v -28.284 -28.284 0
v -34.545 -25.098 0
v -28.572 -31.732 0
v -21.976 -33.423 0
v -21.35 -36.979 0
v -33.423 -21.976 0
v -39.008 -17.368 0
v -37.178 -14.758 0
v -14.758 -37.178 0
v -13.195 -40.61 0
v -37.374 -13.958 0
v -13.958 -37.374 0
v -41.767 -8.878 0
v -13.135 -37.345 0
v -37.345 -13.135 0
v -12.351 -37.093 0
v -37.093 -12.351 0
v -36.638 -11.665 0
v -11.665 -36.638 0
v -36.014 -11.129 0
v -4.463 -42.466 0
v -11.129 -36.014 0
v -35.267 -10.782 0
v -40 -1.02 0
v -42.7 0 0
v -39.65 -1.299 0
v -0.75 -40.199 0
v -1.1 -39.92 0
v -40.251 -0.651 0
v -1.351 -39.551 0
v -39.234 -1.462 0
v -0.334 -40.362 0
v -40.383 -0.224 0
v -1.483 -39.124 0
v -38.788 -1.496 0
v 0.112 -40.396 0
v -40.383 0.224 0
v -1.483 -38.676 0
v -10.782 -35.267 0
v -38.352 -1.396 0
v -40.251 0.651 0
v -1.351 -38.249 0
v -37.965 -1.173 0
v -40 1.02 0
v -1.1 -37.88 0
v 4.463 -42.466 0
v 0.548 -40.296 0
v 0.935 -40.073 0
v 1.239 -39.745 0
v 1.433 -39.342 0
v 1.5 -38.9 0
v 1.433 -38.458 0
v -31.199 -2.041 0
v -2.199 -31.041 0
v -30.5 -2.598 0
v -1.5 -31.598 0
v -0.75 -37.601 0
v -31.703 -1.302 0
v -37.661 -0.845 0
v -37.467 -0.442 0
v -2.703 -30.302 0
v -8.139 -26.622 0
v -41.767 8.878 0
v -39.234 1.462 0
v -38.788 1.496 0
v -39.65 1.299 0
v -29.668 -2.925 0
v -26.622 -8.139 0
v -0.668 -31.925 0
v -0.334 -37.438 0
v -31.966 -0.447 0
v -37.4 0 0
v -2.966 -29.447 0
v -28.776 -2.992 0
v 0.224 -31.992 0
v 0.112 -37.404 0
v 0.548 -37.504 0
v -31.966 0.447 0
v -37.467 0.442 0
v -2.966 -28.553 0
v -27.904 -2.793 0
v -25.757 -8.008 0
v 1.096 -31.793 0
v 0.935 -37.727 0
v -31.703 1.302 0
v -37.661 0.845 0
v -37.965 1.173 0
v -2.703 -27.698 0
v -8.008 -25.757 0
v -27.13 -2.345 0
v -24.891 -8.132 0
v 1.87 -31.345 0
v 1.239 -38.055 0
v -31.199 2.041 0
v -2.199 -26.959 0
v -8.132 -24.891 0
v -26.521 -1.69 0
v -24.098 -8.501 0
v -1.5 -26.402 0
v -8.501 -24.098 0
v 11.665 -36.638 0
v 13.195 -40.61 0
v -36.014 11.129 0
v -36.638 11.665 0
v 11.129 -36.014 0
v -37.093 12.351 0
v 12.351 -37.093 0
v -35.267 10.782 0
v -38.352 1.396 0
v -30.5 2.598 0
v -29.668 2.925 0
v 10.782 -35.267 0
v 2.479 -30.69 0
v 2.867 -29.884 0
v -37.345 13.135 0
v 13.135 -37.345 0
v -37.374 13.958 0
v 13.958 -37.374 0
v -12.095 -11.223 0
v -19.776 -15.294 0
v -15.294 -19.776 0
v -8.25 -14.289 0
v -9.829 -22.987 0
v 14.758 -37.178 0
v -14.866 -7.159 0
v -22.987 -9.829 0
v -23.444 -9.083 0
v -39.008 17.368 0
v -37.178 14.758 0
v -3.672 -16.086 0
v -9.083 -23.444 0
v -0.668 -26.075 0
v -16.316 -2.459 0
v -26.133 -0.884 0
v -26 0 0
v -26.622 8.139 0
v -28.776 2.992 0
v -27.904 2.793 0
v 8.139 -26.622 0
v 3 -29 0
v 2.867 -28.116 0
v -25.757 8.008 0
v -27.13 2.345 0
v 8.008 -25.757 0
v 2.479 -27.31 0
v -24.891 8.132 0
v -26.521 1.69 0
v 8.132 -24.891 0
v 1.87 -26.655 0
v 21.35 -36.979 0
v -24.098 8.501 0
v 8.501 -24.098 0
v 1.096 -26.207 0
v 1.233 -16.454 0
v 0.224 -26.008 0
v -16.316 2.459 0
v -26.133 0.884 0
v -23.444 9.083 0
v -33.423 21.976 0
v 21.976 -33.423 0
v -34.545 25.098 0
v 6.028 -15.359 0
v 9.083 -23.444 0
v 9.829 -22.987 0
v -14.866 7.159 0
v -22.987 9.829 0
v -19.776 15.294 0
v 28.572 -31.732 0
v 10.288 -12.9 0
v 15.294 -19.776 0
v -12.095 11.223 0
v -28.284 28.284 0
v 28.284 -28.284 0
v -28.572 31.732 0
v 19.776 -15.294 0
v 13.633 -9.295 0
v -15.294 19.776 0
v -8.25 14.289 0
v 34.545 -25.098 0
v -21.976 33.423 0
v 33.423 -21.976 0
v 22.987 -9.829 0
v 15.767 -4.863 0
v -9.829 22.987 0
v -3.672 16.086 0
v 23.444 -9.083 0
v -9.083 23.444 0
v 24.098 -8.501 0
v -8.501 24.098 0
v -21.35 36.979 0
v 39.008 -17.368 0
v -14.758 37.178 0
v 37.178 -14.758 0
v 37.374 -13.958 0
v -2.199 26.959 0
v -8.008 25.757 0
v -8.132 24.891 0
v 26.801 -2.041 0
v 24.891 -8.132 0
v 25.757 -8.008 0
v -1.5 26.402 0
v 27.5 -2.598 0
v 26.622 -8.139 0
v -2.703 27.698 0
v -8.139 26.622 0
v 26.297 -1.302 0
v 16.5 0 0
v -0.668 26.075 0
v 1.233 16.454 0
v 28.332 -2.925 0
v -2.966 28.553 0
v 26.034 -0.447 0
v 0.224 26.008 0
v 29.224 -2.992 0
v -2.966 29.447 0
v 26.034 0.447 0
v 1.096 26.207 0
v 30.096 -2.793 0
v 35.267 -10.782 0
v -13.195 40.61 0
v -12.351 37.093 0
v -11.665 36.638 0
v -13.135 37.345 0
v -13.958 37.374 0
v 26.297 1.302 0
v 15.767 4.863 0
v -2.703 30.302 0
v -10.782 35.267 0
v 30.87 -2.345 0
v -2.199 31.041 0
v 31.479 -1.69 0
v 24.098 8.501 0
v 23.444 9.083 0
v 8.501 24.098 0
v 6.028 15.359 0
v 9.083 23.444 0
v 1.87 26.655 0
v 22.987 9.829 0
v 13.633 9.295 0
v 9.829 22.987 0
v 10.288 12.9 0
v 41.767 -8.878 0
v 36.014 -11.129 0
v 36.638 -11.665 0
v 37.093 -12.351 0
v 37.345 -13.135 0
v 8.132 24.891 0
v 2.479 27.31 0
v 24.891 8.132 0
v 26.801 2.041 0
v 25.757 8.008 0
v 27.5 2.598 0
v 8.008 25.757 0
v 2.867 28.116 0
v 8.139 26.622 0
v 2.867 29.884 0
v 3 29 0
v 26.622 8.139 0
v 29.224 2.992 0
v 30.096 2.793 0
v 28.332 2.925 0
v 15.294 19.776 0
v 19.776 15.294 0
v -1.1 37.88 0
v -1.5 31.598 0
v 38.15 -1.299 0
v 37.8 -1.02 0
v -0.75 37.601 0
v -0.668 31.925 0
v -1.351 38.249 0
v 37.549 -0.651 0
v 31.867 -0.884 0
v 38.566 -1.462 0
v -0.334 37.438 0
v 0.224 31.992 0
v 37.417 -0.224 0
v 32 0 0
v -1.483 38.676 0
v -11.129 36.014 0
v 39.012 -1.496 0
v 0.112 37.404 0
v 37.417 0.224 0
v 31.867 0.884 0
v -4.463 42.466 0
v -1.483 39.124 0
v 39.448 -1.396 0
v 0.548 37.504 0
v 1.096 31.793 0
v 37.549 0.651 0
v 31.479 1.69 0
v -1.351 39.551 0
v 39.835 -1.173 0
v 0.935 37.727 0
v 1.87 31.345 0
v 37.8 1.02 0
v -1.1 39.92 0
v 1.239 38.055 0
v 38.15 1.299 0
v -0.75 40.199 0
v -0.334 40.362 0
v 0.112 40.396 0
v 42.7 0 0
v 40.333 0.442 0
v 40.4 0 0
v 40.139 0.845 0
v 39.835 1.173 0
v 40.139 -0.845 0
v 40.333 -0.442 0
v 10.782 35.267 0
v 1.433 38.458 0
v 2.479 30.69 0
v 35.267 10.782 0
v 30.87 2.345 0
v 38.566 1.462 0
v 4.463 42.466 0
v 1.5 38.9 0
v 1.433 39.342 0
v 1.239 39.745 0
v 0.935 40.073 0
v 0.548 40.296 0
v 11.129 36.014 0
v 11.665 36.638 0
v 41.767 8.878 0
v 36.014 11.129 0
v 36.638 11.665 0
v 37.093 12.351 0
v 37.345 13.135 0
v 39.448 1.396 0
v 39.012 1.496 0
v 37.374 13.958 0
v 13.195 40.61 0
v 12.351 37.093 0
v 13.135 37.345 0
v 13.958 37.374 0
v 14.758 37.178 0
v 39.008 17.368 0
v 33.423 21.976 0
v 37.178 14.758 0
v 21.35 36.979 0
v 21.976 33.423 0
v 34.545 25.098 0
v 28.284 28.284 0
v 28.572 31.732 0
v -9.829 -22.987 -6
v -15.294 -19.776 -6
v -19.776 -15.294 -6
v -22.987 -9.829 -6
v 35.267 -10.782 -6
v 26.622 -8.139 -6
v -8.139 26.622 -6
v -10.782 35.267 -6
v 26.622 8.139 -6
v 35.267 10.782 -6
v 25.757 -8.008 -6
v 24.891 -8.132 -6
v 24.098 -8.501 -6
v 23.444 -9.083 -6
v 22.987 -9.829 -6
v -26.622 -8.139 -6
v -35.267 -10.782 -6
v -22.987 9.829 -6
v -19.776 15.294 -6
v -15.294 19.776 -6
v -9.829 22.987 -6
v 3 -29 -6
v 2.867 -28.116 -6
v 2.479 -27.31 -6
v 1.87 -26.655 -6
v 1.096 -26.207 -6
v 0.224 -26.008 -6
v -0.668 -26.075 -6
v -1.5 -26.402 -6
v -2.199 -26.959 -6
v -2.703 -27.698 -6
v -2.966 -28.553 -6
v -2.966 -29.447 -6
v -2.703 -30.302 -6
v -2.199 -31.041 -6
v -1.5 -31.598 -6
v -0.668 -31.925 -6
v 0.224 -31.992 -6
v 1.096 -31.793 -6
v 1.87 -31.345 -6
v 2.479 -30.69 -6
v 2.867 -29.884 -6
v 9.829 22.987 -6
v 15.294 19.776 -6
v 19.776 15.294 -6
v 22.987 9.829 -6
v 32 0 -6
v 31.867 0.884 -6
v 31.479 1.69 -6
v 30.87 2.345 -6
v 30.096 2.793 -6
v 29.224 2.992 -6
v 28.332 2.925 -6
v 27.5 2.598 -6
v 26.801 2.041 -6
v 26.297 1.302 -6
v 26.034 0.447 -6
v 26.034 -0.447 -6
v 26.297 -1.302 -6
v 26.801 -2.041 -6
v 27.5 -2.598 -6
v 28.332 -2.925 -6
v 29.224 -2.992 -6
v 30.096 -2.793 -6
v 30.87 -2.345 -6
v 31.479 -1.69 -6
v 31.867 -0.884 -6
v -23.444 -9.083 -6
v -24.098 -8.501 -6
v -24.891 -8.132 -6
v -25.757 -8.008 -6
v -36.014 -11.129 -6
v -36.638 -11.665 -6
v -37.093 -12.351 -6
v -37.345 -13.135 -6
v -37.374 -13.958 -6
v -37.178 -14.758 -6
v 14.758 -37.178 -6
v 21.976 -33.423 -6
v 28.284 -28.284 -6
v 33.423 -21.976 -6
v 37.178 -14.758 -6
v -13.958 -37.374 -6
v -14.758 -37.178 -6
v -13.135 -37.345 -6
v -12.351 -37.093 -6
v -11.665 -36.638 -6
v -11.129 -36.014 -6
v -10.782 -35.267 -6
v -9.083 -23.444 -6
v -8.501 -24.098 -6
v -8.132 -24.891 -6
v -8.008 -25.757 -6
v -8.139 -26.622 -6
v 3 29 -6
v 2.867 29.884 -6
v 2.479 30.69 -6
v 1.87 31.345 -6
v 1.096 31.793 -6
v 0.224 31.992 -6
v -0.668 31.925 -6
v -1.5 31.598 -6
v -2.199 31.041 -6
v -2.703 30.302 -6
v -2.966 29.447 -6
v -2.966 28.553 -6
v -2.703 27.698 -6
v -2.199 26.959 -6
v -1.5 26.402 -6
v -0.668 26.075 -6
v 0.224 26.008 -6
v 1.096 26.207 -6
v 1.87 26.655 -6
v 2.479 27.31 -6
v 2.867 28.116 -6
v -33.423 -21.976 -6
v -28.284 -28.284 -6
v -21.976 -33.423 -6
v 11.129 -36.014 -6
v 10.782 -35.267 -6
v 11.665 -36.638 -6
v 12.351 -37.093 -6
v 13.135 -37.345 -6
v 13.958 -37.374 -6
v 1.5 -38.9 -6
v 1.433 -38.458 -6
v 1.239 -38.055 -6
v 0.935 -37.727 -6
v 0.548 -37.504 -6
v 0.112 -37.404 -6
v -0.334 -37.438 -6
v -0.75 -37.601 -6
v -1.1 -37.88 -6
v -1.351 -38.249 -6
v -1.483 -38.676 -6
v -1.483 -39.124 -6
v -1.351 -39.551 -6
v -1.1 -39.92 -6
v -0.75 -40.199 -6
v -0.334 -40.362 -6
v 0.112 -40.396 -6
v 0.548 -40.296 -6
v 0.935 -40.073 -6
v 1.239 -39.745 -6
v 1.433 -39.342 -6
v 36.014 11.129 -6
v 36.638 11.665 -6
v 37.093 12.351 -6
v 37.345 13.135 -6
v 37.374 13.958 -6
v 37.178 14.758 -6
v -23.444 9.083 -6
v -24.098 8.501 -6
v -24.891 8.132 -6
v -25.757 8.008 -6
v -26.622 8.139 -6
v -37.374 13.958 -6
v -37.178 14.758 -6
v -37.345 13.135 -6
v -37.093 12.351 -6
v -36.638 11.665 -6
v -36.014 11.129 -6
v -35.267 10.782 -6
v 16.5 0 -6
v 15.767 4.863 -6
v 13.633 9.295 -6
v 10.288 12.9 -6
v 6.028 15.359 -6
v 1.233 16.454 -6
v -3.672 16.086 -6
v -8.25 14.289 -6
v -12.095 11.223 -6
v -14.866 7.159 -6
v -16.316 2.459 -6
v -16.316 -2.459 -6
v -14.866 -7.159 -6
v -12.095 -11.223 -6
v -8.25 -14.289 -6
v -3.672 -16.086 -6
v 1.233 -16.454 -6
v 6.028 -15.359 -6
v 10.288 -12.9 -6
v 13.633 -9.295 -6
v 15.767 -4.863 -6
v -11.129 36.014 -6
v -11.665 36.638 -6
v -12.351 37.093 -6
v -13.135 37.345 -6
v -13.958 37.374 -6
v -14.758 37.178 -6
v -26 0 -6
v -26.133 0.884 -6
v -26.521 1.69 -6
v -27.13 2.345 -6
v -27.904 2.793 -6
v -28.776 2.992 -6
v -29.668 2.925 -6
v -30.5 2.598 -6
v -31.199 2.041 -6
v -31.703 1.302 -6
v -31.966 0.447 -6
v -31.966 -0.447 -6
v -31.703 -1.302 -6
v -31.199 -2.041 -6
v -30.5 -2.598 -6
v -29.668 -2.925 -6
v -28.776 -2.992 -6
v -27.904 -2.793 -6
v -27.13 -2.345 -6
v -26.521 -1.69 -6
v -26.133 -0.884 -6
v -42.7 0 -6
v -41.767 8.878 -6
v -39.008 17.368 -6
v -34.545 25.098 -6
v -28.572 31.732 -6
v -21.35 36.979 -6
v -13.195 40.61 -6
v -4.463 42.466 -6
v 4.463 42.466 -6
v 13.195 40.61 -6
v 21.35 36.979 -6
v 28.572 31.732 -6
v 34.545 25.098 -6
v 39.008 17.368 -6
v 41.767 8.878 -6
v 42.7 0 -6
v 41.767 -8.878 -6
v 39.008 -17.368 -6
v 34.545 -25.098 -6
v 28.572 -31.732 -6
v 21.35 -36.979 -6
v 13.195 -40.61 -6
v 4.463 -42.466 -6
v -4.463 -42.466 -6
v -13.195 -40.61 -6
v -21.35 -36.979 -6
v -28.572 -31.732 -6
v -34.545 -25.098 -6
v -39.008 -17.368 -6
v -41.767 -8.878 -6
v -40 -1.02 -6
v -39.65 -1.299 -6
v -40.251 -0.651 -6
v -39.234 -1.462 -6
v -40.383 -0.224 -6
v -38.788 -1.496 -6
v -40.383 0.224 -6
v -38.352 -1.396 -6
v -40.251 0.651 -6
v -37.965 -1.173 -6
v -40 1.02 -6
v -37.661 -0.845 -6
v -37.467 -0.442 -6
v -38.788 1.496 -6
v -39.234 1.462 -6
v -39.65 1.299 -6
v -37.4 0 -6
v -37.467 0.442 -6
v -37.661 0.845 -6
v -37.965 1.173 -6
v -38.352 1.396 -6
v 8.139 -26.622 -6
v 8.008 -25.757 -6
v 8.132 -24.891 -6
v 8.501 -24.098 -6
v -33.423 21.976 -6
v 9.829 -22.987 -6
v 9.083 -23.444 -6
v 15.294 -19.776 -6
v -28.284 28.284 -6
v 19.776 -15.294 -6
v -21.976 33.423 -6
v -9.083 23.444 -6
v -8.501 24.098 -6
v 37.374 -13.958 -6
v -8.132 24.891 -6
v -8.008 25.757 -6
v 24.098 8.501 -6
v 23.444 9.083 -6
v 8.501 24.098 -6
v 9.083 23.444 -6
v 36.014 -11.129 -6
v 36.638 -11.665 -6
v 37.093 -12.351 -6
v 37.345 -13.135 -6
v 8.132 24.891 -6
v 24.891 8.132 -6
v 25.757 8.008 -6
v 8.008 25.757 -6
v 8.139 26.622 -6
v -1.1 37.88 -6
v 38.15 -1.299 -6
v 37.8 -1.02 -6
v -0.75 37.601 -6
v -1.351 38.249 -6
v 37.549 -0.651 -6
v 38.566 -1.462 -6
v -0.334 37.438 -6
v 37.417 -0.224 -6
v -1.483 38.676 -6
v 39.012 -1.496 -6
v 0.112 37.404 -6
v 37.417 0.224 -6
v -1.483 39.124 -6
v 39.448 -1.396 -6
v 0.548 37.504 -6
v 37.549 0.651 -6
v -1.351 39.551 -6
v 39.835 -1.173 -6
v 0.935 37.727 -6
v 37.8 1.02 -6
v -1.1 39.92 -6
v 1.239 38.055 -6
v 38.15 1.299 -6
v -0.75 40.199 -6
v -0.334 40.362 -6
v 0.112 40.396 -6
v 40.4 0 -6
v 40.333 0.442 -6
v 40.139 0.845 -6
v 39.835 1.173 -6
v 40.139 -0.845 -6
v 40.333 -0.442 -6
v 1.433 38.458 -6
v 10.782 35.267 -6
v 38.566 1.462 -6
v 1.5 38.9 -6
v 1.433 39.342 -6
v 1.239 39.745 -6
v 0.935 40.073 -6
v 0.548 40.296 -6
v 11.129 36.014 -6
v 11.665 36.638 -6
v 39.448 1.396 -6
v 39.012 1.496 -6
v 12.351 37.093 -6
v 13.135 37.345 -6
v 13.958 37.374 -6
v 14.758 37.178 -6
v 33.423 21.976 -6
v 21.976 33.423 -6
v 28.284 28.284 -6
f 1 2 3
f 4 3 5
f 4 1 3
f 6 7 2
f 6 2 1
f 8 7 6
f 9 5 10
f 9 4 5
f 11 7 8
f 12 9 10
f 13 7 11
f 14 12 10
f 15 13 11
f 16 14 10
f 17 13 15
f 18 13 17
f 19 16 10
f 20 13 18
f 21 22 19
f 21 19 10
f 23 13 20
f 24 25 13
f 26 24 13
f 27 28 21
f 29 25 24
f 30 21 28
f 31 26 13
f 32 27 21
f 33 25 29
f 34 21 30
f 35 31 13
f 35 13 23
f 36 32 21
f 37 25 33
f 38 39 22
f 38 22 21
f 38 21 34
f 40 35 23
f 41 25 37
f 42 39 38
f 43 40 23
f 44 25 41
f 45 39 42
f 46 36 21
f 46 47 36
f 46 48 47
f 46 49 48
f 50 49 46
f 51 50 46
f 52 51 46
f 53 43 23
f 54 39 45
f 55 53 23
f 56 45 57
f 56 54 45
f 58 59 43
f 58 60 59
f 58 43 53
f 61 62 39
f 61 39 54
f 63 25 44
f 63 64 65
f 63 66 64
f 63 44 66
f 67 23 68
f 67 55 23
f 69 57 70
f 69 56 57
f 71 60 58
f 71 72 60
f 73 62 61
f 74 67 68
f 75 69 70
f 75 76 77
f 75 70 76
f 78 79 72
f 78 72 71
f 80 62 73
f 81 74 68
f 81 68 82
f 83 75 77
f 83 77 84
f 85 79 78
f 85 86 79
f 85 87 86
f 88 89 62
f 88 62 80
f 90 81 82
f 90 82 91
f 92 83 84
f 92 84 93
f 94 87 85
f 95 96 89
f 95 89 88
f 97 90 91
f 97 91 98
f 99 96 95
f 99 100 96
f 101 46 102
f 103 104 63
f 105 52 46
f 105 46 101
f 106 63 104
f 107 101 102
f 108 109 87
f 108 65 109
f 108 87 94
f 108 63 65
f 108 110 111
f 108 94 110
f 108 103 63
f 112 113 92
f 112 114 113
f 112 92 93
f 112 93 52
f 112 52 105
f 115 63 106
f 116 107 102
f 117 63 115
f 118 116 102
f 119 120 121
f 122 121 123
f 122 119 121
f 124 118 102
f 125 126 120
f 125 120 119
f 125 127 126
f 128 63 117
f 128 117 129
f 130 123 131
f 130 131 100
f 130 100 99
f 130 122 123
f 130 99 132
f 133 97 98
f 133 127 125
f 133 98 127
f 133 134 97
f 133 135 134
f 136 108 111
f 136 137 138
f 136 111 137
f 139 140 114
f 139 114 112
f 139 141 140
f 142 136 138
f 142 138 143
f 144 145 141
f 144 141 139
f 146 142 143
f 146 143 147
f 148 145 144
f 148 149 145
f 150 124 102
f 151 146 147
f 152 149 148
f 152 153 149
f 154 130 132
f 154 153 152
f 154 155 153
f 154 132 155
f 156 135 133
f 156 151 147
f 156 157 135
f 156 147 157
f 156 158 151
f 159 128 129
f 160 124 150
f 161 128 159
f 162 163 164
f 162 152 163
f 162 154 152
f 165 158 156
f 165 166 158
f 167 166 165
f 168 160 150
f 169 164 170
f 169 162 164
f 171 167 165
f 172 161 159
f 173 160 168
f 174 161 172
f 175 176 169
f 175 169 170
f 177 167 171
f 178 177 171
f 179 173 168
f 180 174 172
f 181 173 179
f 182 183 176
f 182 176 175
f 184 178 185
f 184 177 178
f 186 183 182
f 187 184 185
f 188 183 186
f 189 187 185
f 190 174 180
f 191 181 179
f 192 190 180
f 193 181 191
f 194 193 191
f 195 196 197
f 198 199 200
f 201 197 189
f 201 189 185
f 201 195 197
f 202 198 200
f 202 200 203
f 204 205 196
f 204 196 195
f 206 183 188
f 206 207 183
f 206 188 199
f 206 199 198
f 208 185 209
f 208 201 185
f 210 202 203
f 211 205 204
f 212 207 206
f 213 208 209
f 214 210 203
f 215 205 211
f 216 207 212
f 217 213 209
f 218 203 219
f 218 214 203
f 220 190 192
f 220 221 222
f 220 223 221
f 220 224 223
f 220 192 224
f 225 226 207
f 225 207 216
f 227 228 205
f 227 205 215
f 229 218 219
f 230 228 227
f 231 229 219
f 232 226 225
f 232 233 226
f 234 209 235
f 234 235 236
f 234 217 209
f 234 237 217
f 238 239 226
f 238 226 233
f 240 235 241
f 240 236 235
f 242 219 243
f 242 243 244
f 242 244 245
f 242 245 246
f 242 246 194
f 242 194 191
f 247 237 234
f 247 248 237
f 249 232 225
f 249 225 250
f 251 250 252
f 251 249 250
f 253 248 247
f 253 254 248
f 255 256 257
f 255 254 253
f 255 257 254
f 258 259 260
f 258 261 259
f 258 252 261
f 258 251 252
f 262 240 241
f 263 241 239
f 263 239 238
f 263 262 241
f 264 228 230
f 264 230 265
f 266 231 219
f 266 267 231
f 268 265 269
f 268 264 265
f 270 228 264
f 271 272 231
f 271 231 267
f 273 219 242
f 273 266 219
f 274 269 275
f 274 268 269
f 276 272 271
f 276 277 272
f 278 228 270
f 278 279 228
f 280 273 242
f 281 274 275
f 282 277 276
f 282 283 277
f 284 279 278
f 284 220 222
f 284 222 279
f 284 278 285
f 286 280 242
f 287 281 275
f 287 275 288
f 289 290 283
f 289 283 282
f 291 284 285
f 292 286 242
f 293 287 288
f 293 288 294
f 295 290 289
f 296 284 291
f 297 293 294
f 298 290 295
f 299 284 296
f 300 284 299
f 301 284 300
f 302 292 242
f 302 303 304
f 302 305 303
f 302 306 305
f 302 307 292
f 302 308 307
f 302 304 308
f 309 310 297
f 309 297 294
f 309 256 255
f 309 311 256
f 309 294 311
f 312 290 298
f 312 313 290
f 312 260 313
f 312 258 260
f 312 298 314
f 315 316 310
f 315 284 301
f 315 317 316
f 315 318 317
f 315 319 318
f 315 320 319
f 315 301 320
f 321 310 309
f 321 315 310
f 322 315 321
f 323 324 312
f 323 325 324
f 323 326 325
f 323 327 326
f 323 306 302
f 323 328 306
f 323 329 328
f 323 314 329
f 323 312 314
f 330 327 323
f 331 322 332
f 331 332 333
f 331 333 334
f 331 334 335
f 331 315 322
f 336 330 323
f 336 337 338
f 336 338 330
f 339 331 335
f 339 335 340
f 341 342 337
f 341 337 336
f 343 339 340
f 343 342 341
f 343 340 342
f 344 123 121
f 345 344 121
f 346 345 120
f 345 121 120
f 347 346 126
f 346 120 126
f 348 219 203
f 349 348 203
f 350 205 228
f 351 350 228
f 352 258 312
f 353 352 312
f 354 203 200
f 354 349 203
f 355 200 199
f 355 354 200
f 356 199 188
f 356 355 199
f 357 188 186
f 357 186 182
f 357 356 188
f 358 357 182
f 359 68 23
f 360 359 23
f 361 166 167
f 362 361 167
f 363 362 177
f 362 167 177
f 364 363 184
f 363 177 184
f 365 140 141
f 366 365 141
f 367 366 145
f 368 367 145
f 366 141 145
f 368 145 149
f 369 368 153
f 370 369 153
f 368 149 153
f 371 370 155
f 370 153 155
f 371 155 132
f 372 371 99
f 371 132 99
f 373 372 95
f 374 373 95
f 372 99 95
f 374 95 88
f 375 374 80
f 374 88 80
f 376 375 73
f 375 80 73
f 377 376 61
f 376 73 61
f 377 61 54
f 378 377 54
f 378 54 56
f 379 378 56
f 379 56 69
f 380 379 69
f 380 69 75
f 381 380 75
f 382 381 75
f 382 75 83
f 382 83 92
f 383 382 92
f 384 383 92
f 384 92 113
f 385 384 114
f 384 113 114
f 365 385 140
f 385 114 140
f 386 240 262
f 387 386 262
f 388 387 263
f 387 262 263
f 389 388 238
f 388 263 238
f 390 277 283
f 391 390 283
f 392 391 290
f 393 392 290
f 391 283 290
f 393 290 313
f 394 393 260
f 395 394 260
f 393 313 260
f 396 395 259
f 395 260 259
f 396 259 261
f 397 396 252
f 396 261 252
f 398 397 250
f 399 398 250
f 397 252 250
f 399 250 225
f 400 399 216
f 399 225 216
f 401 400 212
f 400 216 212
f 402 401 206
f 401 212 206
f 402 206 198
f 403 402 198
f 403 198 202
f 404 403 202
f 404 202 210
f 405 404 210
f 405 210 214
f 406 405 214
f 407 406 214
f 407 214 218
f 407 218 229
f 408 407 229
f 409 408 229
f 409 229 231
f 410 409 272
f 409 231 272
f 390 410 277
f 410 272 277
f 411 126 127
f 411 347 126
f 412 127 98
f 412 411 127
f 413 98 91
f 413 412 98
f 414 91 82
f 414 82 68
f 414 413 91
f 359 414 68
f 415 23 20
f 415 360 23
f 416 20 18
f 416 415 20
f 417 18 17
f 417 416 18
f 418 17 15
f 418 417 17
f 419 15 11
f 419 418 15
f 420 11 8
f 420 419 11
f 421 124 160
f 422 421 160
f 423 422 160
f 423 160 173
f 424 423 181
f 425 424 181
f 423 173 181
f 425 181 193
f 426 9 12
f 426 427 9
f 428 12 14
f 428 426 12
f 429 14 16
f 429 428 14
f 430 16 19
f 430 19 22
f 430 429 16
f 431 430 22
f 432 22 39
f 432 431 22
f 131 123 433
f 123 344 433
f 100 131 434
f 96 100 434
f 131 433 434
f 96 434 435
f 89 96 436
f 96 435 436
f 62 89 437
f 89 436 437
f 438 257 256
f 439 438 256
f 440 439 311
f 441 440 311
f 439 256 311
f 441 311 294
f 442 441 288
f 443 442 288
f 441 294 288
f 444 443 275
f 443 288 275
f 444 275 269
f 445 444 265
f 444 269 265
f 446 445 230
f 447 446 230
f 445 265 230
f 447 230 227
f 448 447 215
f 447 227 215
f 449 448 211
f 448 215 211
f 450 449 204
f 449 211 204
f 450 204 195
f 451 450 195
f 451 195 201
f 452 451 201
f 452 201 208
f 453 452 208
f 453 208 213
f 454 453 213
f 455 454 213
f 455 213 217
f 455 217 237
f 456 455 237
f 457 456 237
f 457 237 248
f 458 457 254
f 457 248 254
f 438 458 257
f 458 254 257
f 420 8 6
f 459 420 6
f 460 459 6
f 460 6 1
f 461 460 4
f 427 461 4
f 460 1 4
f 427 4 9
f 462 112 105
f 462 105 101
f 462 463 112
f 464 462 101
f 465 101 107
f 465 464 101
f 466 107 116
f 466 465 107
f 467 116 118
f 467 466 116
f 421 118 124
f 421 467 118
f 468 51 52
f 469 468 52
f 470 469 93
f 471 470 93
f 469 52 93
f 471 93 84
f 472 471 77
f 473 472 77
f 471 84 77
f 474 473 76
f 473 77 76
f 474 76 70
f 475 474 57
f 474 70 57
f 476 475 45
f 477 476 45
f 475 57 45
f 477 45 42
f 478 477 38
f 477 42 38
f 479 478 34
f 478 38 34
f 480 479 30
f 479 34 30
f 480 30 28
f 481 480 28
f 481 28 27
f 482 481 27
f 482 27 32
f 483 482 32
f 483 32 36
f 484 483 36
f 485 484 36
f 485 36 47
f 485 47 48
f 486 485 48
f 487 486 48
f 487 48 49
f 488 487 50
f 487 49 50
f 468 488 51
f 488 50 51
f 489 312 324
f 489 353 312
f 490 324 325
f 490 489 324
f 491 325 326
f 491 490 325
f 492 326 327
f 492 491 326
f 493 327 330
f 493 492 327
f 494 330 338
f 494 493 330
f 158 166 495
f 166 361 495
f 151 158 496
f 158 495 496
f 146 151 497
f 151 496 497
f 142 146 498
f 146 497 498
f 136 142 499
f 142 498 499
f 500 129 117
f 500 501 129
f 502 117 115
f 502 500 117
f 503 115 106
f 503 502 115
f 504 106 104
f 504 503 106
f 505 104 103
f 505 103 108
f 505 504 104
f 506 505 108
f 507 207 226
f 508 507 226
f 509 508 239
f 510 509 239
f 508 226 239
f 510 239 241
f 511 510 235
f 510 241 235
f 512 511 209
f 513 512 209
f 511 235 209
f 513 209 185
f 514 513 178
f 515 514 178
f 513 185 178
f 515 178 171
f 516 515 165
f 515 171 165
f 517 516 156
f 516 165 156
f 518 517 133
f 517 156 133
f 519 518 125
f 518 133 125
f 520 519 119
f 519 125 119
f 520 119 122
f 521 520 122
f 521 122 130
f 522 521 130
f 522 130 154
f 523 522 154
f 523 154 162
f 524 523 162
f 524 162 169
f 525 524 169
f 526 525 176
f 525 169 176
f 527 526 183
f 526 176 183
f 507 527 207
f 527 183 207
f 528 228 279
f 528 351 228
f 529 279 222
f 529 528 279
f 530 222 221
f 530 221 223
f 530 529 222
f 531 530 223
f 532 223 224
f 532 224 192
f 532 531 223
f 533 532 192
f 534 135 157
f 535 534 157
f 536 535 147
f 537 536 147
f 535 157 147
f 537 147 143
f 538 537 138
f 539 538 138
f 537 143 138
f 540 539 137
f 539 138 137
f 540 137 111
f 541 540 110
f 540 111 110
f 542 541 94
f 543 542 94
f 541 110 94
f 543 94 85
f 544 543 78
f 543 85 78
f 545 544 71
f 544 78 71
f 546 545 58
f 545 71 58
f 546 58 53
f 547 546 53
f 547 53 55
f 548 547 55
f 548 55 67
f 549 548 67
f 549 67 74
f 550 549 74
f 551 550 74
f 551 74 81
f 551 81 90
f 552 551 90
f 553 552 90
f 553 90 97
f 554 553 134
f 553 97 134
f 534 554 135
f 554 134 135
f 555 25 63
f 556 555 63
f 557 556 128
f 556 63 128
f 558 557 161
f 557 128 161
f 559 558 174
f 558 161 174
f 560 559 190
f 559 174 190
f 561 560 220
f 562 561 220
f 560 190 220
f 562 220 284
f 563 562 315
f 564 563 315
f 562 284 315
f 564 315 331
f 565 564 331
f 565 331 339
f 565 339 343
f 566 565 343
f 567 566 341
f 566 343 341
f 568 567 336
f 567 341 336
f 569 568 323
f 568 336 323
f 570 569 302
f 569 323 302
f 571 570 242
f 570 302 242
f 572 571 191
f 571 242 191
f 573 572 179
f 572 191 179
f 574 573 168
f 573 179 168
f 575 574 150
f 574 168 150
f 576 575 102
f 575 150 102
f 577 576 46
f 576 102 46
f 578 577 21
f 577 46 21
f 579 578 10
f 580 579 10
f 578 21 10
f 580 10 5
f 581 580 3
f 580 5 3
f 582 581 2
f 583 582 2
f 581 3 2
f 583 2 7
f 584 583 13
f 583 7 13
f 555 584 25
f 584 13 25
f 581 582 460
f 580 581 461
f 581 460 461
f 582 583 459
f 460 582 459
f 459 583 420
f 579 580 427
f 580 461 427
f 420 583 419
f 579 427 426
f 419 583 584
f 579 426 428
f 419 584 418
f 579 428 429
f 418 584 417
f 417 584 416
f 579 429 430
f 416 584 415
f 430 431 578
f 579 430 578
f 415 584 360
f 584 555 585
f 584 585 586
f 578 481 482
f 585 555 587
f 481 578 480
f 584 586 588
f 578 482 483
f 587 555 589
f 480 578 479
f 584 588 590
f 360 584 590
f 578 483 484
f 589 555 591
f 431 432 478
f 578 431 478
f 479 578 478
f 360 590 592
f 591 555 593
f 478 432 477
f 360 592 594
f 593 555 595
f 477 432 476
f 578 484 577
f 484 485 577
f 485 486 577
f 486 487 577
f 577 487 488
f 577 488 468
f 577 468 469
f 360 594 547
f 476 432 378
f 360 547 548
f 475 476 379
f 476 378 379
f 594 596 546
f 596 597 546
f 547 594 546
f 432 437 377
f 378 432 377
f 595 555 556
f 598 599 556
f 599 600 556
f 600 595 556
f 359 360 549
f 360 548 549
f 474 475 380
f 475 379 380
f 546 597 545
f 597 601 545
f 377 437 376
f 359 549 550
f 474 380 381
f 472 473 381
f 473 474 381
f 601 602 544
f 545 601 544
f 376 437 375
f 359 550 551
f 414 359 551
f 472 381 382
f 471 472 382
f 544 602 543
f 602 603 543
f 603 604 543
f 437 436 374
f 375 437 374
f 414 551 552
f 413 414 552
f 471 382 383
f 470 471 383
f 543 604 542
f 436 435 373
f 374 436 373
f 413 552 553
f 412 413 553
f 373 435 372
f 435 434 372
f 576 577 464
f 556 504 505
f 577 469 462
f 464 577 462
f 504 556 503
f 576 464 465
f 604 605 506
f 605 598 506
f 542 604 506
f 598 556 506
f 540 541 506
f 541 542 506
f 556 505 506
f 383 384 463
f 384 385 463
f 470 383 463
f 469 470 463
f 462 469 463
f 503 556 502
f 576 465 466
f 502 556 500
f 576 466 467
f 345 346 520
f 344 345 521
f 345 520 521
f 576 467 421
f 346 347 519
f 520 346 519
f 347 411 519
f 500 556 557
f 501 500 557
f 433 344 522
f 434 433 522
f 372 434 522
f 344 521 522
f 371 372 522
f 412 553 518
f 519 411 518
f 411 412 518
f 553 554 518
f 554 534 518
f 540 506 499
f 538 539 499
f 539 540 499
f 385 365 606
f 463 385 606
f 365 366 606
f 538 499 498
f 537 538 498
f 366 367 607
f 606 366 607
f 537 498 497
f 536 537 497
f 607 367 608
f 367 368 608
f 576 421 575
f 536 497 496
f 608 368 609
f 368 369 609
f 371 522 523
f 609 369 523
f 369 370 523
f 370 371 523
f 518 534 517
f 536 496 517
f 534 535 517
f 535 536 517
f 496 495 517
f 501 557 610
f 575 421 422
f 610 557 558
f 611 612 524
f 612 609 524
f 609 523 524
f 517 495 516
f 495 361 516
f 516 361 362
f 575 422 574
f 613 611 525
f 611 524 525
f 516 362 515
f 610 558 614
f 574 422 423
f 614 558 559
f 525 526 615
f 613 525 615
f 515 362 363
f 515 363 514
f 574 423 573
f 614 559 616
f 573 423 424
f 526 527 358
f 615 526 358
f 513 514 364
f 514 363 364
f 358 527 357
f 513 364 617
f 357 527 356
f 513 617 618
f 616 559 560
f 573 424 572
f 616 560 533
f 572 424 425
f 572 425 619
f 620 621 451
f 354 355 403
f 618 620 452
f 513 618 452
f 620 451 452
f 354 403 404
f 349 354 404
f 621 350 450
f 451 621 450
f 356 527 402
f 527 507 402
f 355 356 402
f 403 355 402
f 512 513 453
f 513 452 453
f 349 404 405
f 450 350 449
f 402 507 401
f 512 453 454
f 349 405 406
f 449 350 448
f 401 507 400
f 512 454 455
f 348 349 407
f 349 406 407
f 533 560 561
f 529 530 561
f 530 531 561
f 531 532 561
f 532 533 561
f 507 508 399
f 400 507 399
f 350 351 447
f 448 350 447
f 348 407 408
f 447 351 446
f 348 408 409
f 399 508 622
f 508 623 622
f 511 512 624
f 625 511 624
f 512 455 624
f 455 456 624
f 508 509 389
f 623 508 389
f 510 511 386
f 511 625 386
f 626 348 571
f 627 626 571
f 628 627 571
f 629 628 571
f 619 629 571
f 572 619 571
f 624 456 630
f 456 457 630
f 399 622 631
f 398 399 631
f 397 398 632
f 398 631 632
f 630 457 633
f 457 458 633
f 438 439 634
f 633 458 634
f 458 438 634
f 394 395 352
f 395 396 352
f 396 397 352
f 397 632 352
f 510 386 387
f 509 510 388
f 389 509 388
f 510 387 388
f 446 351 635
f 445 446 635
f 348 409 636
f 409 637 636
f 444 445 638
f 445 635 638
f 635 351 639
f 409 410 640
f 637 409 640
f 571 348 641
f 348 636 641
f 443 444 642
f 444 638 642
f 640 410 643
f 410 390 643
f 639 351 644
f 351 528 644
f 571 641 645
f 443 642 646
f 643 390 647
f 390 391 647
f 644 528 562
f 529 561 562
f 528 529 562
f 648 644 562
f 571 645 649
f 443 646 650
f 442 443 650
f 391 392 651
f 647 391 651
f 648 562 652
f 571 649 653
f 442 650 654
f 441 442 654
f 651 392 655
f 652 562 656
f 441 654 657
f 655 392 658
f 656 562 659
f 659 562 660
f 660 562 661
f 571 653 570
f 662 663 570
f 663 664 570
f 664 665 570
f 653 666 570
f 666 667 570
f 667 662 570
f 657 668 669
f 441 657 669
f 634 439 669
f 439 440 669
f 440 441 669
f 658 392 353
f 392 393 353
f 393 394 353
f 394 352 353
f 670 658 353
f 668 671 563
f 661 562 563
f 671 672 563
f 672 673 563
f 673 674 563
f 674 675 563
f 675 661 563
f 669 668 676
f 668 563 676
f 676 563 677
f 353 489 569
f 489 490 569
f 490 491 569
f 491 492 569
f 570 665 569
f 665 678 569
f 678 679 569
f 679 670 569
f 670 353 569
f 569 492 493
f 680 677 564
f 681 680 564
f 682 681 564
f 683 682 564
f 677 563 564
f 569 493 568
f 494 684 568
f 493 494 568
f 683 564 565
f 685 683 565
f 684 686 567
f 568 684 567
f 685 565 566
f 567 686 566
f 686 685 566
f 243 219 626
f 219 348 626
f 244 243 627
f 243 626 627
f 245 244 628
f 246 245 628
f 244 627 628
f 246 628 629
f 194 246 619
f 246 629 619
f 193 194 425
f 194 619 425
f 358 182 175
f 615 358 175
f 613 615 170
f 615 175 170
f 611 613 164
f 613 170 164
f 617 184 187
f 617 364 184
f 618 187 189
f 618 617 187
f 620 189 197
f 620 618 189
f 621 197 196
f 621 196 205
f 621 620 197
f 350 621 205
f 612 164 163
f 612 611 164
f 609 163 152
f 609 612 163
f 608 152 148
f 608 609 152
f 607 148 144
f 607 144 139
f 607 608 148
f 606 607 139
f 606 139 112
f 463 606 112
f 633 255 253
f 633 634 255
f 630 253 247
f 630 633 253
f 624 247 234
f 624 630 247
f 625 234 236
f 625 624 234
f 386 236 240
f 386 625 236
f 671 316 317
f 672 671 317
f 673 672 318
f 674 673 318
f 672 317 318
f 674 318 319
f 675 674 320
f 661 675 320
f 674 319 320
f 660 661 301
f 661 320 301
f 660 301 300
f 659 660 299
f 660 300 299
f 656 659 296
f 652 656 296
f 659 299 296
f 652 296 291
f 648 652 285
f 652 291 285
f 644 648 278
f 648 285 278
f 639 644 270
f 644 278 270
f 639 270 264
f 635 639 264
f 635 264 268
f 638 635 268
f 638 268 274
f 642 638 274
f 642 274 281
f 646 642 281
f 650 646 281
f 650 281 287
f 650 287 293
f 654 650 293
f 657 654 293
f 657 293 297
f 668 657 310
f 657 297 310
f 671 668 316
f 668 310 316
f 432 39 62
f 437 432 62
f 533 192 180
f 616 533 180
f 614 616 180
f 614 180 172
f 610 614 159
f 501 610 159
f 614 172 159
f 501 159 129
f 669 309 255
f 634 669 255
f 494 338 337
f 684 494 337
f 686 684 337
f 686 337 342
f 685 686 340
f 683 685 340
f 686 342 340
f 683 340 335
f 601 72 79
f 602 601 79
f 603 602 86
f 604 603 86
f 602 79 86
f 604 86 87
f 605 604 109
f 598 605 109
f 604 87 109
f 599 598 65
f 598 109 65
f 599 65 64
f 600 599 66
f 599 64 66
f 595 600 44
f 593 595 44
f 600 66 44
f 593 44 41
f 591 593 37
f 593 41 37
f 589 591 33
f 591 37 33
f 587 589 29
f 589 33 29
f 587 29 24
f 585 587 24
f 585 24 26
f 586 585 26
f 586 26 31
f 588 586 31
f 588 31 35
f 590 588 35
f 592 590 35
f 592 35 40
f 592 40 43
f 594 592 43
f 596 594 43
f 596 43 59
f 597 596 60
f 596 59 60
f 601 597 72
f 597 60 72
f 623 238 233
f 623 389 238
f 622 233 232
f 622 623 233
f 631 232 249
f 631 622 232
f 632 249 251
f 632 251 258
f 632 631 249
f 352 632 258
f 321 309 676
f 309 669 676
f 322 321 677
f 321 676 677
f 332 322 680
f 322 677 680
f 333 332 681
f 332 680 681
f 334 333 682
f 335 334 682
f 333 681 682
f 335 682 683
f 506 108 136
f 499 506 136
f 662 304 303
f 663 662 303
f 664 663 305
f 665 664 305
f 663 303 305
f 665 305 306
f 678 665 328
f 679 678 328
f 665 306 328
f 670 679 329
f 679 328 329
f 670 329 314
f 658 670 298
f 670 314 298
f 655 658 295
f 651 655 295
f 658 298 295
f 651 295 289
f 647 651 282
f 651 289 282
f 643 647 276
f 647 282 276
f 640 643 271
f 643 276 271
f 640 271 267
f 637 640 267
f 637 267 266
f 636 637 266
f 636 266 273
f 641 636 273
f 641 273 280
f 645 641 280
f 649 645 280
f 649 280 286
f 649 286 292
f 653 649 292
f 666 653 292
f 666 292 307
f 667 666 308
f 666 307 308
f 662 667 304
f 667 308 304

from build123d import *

# Parameters (mm, degrees)
SKETCH_2_R          = 43
SKETCH_2_R_2        = 16.5
EXTRUDE_1_DEPTH     = 6
SKETCH_3_R          = 3
SKETCH_3_R_2        = 1.5
CUT_EXTRUDE_1_DEPTH = 6
CUT_EXTRUDE_5_DEPTH = 6
FILLET_2_R          = 3
SKETCH_6_R          = 43
SKETCH_6_R_2        = 42.9
CUT_EXTRUDE_6_DEPTH = 6
CUT_EXTRUDE_START   = -6
SKETCH_7_R          = 42.9
SKETCH_7_R_2        = 42.7
CUT_EXTRUDE_7_DEPTH = 6


with BuildPart() as part:
    # 草图2 → 凸台-拉伸1 (new body)
    with BuildSketch(Plane.XY):
        Circle(SKETCH_2_R)
        Circle(SKETCH_2_R_2, mode=Mode.SUBTRACT)
    extrude(amount=-EXTRUDE_1_DEPTH)

    # 草图3 → 切除-拉伸1 (cut)
    with BuildSketch(Plane.XY):
        with Locations((0, 29)):
            Circle(SKETCH_3_R)
        with Locations((29, 0)):
            Circle(SKETCH_3_R)
        with Locations((0, -29)):
            Circle(SKETCH_3_R)
        with Locations((-29, 0)):
            Circle(SKETCH_3_R)
        with Locations((-38.9, 0)):
            Circle(SKETCH_3_R_2)
        with Locations((0, 38.9)):
            Circle(SKETCH_3_R_2)
        with Locations((38.9, 0)):
            Circle(SKETCH_3_R_2)
        with Locations((0, -38.9)):
            Circle(SKETCH_3_R_2)
    extrude(amount=-CUT_EXTRUDE_1_DEPTH, mode=Mode.SUBTRACT)

    # 草图4 → 切除-拉伸5 (cut)
    with BuildSketch(Plane.XY):
        with BuildLine():
            ThreePointArc((-23.907618899, 7.309292618), (-17.67766953, 17.67766953), (-7.309292618, 23.907618899))
            Line((-7.309292618, 23.907618899), (-11.694868189, 38.252190239))
            ThreePointArc((-11.694868189, 38.252190239), (-28.284271247, 28.284271247), (-38.252190239, 11.694868189))
            Line((-38.252190239, 11.694868189), (-23.907618899, 7.309292618))
        make_face()
        with BuildLine():
            Line((11.694868189, 38.252190239), (7.309292618, 23.907618899))
            ThreePointArc((7.309292618, 23.907618899), (17.67766953, 17.67766953), (23.907618899, 7.309292618))
            Line((23.907618899, 7.309292618), (38.252190239, 11.694868189))
            ThreePointArc((38.252190239, 11.694868189), (28.284271247, 28.284271247), (11.694868189, 38.252190239))
        make_face()
        with BuildLine():
            Line((38.252190239, -11.694868189), (23.907618899, -7.309292618))
            ThreePointArc((23.907618899, -7.309292618), (17.67766953, -17.67766953), (7.309292618, -23.907618899))
            Line((7.309292618, -23.907618899), (11.694868189, -38.252190239))
            ThreePointArc((11.694868189, -38.252190239), (28.284271247, -28.284271247), (38.252190239, -11.694868189))
        make_face()
        with BuildLine():
            ThreePointArc((-7.309292618, -23.907618899), (-17.67766953, -17.67766953), (-23.907618899, -7.309292618))
            Line((-23.907618899, -7.309292618), (-38.252190239, -11.694868189))
            ThreePointArc((-38.252190239, -11.694868189), (-28.284271247, -28.284271247), (-11.694868189, -38.252190239))
            Line((-11.694868189, -38.252190239), (-7.309292618, -23.907618899))
        make_face()
    extrude(amount=-CUT_EXTRUDE_5_DEPTH, mode=Mode.SUBTRACT)

    # 圆角2
    fillet_2_edges = [part.edges().sort_by_distance(p)[0] for p in [
        (-38.252190239, -11.694868189, -3),
        (-23.907618899, -7.309292618, -3),
        (-7.309292618, -23.907618899, -3),
        (-11.694868189, -38.252190239, -3),
        (11.694868189, -38.252190239, -3),
        (7.309292618, -23.907618899, -3),
        (23.907618899, -7.309292618, -3),
        (38.252190239, -11.694868189, -3),
        (38.252190239, 11.694868189, -3),
        (23.907618899, 7.309292618, -3),
        (7.309292618, 23.907618899, -3),
        (11.694868189, 38.252190239, -3),
        (-11.694868189, 38.252190239, -3),
        (-7.309292618, 23.907618899, -3),
        (-23.907618899, 7.309292618, -3),
        (-38.252190239, 11.694868189, -3),
    ]]
    fillet(fillet_2_edges, radius=FILLET_2_R)

    # 草图6 → 切除-拉伸6 (cut)
    with BuildSketch(Plane.XY):
        Circle(SKETCH_6_R)
        Circle(SKETCH_6_R_2, mode=Mode.SUBTRACT)
    extrude(amount=-CUT_EXTRUDE_6_DEPTH, mode=Mode.SUBTRACT)

    # 草图7 → 切除-拉伸7 (cut)
    with BuildSketch(Plane(origin=(0, 0, -6), x_dir=(-1, 0, 0), z_dir=(0, 0, -1)).offset(CUT_EXTRUDE_START)):
        Circle(SKETCH_7_R)
        Circle(SKETCH_7_R_2, mode=Mode.SUBTRACT)
    extrude(amount=CUT_EXTRUDE_7_DEPTH, mode=Mode.SUBTRACT)


solid = part.part
